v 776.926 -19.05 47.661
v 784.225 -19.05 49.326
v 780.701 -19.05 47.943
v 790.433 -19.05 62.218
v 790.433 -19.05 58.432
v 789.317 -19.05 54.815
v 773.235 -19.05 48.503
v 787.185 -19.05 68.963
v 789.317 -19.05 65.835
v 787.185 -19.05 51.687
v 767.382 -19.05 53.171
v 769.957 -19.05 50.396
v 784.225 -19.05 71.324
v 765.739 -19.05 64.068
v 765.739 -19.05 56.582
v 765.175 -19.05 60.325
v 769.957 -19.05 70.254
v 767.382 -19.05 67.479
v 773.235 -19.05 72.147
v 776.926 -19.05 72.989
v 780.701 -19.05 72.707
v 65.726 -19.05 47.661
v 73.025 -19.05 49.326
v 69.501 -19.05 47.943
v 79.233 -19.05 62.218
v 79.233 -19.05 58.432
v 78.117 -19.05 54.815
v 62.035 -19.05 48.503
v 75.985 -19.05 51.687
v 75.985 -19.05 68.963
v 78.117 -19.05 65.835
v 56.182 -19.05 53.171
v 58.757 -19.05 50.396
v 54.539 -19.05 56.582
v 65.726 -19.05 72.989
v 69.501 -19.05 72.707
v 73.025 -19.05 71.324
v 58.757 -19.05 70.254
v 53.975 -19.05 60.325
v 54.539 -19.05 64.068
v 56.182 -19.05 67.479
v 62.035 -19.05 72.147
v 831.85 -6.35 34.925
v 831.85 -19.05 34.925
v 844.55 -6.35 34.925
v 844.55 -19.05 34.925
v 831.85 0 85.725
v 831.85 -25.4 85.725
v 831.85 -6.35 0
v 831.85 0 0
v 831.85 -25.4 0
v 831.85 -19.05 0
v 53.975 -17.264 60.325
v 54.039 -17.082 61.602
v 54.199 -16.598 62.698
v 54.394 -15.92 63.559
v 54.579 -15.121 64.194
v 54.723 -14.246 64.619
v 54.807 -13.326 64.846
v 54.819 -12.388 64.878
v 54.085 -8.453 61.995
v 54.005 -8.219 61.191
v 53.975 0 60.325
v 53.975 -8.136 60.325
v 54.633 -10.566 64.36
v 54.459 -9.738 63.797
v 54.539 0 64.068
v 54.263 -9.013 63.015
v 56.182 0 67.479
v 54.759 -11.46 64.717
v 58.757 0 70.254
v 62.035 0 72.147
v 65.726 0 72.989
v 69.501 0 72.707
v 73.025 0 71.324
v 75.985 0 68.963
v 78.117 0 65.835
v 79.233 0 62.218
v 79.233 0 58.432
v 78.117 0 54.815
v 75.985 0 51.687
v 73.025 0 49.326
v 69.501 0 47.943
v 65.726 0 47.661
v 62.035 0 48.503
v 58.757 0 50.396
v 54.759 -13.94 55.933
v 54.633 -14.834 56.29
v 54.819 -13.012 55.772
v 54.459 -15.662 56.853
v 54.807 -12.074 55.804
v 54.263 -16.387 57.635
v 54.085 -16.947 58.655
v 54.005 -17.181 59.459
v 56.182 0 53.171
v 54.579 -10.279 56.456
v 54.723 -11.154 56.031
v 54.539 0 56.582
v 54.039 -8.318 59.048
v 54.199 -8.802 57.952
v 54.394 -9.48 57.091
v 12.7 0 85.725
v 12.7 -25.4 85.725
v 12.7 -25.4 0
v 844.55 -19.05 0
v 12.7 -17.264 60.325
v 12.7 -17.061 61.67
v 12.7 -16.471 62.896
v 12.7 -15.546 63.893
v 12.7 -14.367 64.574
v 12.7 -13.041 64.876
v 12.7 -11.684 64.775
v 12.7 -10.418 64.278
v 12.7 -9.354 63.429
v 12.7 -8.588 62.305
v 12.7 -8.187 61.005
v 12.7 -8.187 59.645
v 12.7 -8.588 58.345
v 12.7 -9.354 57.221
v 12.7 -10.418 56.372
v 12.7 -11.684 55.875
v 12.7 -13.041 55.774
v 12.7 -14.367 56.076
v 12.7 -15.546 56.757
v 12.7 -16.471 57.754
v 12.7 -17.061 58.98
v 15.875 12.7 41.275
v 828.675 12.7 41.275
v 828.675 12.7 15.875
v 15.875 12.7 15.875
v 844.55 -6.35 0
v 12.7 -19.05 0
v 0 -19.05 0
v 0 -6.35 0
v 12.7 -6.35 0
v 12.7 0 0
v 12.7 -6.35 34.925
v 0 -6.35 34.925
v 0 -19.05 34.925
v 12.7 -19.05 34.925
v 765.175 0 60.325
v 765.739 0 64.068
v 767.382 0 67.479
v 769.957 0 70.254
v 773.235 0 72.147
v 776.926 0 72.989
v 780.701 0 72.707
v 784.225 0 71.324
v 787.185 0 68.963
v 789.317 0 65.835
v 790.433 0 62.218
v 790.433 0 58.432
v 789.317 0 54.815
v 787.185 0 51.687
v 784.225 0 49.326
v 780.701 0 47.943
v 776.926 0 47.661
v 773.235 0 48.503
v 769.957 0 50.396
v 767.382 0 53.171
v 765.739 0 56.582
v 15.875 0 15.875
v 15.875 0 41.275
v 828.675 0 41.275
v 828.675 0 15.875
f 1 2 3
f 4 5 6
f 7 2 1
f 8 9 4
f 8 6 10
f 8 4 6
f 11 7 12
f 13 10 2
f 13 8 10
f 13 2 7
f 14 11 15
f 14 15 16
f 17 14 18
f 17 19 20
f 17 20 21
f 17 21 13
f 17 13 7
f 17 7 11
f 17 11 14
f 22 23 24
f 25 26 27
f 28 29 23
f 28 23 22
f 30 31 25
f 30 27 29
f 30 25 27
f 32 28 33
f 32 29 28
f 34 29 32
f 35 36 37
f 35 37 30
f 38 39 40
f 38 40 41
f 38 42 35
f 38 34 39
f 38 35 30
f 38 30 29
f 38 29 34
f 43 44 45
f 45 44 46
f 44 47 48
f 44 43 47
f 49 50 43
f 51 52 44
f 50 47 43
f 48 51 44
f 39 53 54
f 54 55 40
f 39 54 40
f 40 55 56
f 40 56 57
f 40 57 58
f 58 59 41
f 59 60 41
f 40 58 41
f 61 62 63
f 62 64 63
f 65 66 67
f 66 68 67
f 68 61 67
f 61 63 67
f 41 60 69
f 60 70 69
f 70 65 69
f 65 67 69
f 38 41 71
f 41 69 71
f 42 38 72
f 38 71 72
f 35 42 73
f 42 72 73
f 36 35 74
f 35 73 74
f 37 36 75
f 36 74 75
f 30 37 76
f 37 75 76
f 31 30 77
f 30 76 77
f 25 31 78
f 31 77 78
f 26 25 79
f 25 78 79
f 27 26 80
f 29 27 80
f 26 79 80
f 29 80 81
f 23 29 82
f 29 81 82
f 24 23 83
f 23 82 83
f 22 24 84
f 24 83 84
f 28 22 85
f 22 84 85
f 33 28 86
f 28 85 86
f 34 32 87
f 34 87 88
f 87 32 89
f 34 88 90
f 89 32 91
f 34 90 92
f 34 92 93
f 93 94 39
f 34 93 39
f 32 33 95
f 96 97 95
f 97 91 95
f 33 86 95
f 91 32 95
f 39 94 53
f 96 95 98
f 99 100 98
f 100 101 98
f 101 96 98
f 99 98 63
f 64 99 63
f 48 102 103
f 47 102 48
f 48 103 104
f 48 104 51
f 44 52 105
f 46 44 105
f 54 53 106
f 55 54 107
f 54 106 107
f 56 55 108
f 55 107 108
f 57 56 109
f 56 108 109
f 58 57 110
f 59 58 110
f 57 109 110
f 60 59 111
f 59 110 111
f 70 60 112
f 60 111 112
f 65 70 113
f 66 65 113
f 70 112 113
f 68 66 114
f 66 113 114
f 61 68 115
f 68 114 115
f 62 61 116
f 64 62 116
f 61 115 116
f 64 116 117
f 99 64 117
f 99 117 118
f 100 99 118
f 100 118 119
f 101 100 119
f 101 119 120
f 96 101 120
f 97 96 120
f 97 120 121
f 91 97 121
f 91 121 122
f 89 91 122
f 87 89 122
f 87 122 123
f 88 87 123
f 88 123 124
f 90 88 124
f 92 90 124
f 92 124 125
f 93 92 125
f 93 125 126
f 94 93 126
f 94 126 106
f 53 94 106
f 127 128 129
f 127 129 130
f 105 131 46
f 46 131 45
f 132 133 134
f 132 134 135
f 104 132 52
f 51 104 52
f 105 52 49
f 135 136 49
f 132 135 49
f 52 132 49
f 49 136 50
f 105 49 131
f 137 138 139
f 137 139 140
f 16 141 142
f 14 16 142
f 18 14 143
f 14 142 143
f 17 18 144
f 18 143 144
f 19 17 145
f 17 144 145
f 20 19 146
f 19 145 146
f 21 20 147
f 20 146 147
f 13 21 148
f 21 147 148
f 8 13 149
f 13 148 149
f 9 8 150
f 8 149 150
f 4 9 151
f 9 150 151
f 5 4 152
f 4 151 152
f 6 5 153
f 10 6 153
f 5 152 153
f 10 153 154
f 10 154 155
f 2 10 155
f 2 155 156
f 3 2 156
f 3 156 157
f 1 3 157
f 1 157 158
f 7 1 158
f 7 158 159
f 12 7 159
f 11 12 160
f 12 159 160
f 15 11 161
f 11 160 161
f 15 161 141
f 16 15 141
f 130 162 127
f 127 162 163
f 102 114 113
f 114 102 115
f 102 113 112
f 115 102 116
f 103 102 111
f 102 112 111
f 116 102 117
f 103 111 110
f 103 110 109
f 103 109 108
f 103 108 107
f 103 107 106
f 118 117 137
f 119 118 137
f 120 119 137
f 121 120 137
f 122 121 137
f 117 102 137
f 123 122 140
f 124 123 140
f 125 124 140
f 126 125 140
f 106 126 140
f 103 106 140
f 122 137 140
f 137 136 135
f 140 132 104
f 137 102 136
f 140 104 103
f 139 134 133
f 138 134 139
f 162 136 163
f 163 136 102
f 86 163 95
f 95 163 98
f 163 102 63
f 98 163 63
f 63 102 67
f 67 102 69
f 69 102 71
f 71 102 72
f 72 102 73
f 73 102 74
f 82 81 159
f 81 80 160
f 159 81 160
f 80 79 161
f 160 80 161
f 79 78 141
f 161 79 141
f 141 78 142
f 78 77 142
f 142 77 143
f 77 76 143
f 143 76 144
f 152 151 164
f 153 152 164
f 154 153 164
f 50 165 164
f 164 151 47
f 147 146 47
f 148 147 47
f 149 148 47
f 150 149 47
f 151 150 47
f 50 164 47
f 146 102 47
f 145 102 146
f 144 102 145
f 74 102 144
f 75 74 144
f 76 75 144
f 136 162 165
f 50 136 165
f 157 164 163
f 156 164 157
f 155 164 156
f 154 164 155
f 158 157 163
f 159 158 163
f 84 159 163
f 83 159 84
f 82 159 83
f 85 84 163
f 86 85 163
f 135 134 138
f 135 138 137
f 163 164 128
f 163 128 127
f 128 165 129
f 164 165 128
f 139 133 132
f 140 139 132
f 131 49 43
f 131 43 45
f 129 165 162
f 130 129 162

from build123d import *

# Parameters (mm, degrees)
F0_W      = 844.55
F0_H      = 85.725
F1_DEPTH  = 25.4
F2_W      = 12.7
F2_H      = 50.8
F3_DEPTH  = 25.401
F4_W      = 12.7
F4_H      = 6.35
F5_DEPTH  = 85.726
F6_R      = 4.564063
F7_DEPTH  = 50.8
F8_R      = 12.7
F9_DEPTH  = 19.05
F10_W     = 812.8
F10_H     = 25.4
F11_DEPTH = 12.7


with BuildPart() as f1:
    # F0 (on Front) → F1 (new body)
    with BuildSketch(Plane.XZ):
        with Locations((422.275, 42.8625)):
            Rectangle(F0_W, F0_H)
    extrude(amount=F1_DEPTH)

    # F2 (on face) → F3 (cut, through all)
    with BuildSketch(Plane.XZ.offset(25.4)):
        with Locations((6.35, 60.325)):
            Rectangle(F2_W, F2_H)
        with Locations((838.2, 60.325)):
            Rectangle(F2_W, F2_H)
    extrude(amount=-F3_DEPTH, mode=Mode.SUBTRACT)

    # F4 (on face) → F5 (cut, through all)
    with BuildSketch(Plane(origin=(0, 0, 0), x_dir=(1, 0, 0), z_dir=(0, 0, -1))):
        with Locations((838.2, 22.225)):
            Rectangle(F4_W, F4_H)
        with Locations((838.2, 3.175)):
            Rectangle(F4_W, F4_H)
        with Locations((6.35, 22.225)):
            Rectangle(F4_W, F4_H)
        with Locations((6.35, 3.175)):
            Rectangle(F4_W, F4_H)
    extrude(amount=-F5_DEPTH, mode=Mode.SUBTRACT)

    # F6 (on face) → F7 (cut)
    with BuildSketch(Plane(origin=(12.7, 0, 0), x_dir=(0, -1, 0), z_dir=(-1, 0, 0))):
        with Locations((12.7, 60.325)):
            Circle(F6_R)
    extrude(amount=-F7_DEPTH, mode=Mode.SUBTRACT)

    # F8 (on face) → F9 (cut)
    with BuildSketch(Plane(origin=(0, 0, 0), x_dir=(-1, 0, 0), z_dir=(0, 1, 0))):
        with Locations((-66.675, 60.325)):
            Circle(F8_R)
        with Locations((-777.875, 60.325)):
            Circle(F8_R)
    extrude(amount=-F9_DEPTH, mode=Mode.SUBTRACT)

    # F10 (on face) → F11 (join)
    with BuildSketch(Plane(origin=(0, 0, 0), x_dir=(-1, 0, 0), z_dir=(0, 1, 0))):
        with Locations((-422.275, 28.575)):
            Rectangle(F10_W, F10_H)
    extrude(amount=F11_DEPTH)


solid = f1.part
